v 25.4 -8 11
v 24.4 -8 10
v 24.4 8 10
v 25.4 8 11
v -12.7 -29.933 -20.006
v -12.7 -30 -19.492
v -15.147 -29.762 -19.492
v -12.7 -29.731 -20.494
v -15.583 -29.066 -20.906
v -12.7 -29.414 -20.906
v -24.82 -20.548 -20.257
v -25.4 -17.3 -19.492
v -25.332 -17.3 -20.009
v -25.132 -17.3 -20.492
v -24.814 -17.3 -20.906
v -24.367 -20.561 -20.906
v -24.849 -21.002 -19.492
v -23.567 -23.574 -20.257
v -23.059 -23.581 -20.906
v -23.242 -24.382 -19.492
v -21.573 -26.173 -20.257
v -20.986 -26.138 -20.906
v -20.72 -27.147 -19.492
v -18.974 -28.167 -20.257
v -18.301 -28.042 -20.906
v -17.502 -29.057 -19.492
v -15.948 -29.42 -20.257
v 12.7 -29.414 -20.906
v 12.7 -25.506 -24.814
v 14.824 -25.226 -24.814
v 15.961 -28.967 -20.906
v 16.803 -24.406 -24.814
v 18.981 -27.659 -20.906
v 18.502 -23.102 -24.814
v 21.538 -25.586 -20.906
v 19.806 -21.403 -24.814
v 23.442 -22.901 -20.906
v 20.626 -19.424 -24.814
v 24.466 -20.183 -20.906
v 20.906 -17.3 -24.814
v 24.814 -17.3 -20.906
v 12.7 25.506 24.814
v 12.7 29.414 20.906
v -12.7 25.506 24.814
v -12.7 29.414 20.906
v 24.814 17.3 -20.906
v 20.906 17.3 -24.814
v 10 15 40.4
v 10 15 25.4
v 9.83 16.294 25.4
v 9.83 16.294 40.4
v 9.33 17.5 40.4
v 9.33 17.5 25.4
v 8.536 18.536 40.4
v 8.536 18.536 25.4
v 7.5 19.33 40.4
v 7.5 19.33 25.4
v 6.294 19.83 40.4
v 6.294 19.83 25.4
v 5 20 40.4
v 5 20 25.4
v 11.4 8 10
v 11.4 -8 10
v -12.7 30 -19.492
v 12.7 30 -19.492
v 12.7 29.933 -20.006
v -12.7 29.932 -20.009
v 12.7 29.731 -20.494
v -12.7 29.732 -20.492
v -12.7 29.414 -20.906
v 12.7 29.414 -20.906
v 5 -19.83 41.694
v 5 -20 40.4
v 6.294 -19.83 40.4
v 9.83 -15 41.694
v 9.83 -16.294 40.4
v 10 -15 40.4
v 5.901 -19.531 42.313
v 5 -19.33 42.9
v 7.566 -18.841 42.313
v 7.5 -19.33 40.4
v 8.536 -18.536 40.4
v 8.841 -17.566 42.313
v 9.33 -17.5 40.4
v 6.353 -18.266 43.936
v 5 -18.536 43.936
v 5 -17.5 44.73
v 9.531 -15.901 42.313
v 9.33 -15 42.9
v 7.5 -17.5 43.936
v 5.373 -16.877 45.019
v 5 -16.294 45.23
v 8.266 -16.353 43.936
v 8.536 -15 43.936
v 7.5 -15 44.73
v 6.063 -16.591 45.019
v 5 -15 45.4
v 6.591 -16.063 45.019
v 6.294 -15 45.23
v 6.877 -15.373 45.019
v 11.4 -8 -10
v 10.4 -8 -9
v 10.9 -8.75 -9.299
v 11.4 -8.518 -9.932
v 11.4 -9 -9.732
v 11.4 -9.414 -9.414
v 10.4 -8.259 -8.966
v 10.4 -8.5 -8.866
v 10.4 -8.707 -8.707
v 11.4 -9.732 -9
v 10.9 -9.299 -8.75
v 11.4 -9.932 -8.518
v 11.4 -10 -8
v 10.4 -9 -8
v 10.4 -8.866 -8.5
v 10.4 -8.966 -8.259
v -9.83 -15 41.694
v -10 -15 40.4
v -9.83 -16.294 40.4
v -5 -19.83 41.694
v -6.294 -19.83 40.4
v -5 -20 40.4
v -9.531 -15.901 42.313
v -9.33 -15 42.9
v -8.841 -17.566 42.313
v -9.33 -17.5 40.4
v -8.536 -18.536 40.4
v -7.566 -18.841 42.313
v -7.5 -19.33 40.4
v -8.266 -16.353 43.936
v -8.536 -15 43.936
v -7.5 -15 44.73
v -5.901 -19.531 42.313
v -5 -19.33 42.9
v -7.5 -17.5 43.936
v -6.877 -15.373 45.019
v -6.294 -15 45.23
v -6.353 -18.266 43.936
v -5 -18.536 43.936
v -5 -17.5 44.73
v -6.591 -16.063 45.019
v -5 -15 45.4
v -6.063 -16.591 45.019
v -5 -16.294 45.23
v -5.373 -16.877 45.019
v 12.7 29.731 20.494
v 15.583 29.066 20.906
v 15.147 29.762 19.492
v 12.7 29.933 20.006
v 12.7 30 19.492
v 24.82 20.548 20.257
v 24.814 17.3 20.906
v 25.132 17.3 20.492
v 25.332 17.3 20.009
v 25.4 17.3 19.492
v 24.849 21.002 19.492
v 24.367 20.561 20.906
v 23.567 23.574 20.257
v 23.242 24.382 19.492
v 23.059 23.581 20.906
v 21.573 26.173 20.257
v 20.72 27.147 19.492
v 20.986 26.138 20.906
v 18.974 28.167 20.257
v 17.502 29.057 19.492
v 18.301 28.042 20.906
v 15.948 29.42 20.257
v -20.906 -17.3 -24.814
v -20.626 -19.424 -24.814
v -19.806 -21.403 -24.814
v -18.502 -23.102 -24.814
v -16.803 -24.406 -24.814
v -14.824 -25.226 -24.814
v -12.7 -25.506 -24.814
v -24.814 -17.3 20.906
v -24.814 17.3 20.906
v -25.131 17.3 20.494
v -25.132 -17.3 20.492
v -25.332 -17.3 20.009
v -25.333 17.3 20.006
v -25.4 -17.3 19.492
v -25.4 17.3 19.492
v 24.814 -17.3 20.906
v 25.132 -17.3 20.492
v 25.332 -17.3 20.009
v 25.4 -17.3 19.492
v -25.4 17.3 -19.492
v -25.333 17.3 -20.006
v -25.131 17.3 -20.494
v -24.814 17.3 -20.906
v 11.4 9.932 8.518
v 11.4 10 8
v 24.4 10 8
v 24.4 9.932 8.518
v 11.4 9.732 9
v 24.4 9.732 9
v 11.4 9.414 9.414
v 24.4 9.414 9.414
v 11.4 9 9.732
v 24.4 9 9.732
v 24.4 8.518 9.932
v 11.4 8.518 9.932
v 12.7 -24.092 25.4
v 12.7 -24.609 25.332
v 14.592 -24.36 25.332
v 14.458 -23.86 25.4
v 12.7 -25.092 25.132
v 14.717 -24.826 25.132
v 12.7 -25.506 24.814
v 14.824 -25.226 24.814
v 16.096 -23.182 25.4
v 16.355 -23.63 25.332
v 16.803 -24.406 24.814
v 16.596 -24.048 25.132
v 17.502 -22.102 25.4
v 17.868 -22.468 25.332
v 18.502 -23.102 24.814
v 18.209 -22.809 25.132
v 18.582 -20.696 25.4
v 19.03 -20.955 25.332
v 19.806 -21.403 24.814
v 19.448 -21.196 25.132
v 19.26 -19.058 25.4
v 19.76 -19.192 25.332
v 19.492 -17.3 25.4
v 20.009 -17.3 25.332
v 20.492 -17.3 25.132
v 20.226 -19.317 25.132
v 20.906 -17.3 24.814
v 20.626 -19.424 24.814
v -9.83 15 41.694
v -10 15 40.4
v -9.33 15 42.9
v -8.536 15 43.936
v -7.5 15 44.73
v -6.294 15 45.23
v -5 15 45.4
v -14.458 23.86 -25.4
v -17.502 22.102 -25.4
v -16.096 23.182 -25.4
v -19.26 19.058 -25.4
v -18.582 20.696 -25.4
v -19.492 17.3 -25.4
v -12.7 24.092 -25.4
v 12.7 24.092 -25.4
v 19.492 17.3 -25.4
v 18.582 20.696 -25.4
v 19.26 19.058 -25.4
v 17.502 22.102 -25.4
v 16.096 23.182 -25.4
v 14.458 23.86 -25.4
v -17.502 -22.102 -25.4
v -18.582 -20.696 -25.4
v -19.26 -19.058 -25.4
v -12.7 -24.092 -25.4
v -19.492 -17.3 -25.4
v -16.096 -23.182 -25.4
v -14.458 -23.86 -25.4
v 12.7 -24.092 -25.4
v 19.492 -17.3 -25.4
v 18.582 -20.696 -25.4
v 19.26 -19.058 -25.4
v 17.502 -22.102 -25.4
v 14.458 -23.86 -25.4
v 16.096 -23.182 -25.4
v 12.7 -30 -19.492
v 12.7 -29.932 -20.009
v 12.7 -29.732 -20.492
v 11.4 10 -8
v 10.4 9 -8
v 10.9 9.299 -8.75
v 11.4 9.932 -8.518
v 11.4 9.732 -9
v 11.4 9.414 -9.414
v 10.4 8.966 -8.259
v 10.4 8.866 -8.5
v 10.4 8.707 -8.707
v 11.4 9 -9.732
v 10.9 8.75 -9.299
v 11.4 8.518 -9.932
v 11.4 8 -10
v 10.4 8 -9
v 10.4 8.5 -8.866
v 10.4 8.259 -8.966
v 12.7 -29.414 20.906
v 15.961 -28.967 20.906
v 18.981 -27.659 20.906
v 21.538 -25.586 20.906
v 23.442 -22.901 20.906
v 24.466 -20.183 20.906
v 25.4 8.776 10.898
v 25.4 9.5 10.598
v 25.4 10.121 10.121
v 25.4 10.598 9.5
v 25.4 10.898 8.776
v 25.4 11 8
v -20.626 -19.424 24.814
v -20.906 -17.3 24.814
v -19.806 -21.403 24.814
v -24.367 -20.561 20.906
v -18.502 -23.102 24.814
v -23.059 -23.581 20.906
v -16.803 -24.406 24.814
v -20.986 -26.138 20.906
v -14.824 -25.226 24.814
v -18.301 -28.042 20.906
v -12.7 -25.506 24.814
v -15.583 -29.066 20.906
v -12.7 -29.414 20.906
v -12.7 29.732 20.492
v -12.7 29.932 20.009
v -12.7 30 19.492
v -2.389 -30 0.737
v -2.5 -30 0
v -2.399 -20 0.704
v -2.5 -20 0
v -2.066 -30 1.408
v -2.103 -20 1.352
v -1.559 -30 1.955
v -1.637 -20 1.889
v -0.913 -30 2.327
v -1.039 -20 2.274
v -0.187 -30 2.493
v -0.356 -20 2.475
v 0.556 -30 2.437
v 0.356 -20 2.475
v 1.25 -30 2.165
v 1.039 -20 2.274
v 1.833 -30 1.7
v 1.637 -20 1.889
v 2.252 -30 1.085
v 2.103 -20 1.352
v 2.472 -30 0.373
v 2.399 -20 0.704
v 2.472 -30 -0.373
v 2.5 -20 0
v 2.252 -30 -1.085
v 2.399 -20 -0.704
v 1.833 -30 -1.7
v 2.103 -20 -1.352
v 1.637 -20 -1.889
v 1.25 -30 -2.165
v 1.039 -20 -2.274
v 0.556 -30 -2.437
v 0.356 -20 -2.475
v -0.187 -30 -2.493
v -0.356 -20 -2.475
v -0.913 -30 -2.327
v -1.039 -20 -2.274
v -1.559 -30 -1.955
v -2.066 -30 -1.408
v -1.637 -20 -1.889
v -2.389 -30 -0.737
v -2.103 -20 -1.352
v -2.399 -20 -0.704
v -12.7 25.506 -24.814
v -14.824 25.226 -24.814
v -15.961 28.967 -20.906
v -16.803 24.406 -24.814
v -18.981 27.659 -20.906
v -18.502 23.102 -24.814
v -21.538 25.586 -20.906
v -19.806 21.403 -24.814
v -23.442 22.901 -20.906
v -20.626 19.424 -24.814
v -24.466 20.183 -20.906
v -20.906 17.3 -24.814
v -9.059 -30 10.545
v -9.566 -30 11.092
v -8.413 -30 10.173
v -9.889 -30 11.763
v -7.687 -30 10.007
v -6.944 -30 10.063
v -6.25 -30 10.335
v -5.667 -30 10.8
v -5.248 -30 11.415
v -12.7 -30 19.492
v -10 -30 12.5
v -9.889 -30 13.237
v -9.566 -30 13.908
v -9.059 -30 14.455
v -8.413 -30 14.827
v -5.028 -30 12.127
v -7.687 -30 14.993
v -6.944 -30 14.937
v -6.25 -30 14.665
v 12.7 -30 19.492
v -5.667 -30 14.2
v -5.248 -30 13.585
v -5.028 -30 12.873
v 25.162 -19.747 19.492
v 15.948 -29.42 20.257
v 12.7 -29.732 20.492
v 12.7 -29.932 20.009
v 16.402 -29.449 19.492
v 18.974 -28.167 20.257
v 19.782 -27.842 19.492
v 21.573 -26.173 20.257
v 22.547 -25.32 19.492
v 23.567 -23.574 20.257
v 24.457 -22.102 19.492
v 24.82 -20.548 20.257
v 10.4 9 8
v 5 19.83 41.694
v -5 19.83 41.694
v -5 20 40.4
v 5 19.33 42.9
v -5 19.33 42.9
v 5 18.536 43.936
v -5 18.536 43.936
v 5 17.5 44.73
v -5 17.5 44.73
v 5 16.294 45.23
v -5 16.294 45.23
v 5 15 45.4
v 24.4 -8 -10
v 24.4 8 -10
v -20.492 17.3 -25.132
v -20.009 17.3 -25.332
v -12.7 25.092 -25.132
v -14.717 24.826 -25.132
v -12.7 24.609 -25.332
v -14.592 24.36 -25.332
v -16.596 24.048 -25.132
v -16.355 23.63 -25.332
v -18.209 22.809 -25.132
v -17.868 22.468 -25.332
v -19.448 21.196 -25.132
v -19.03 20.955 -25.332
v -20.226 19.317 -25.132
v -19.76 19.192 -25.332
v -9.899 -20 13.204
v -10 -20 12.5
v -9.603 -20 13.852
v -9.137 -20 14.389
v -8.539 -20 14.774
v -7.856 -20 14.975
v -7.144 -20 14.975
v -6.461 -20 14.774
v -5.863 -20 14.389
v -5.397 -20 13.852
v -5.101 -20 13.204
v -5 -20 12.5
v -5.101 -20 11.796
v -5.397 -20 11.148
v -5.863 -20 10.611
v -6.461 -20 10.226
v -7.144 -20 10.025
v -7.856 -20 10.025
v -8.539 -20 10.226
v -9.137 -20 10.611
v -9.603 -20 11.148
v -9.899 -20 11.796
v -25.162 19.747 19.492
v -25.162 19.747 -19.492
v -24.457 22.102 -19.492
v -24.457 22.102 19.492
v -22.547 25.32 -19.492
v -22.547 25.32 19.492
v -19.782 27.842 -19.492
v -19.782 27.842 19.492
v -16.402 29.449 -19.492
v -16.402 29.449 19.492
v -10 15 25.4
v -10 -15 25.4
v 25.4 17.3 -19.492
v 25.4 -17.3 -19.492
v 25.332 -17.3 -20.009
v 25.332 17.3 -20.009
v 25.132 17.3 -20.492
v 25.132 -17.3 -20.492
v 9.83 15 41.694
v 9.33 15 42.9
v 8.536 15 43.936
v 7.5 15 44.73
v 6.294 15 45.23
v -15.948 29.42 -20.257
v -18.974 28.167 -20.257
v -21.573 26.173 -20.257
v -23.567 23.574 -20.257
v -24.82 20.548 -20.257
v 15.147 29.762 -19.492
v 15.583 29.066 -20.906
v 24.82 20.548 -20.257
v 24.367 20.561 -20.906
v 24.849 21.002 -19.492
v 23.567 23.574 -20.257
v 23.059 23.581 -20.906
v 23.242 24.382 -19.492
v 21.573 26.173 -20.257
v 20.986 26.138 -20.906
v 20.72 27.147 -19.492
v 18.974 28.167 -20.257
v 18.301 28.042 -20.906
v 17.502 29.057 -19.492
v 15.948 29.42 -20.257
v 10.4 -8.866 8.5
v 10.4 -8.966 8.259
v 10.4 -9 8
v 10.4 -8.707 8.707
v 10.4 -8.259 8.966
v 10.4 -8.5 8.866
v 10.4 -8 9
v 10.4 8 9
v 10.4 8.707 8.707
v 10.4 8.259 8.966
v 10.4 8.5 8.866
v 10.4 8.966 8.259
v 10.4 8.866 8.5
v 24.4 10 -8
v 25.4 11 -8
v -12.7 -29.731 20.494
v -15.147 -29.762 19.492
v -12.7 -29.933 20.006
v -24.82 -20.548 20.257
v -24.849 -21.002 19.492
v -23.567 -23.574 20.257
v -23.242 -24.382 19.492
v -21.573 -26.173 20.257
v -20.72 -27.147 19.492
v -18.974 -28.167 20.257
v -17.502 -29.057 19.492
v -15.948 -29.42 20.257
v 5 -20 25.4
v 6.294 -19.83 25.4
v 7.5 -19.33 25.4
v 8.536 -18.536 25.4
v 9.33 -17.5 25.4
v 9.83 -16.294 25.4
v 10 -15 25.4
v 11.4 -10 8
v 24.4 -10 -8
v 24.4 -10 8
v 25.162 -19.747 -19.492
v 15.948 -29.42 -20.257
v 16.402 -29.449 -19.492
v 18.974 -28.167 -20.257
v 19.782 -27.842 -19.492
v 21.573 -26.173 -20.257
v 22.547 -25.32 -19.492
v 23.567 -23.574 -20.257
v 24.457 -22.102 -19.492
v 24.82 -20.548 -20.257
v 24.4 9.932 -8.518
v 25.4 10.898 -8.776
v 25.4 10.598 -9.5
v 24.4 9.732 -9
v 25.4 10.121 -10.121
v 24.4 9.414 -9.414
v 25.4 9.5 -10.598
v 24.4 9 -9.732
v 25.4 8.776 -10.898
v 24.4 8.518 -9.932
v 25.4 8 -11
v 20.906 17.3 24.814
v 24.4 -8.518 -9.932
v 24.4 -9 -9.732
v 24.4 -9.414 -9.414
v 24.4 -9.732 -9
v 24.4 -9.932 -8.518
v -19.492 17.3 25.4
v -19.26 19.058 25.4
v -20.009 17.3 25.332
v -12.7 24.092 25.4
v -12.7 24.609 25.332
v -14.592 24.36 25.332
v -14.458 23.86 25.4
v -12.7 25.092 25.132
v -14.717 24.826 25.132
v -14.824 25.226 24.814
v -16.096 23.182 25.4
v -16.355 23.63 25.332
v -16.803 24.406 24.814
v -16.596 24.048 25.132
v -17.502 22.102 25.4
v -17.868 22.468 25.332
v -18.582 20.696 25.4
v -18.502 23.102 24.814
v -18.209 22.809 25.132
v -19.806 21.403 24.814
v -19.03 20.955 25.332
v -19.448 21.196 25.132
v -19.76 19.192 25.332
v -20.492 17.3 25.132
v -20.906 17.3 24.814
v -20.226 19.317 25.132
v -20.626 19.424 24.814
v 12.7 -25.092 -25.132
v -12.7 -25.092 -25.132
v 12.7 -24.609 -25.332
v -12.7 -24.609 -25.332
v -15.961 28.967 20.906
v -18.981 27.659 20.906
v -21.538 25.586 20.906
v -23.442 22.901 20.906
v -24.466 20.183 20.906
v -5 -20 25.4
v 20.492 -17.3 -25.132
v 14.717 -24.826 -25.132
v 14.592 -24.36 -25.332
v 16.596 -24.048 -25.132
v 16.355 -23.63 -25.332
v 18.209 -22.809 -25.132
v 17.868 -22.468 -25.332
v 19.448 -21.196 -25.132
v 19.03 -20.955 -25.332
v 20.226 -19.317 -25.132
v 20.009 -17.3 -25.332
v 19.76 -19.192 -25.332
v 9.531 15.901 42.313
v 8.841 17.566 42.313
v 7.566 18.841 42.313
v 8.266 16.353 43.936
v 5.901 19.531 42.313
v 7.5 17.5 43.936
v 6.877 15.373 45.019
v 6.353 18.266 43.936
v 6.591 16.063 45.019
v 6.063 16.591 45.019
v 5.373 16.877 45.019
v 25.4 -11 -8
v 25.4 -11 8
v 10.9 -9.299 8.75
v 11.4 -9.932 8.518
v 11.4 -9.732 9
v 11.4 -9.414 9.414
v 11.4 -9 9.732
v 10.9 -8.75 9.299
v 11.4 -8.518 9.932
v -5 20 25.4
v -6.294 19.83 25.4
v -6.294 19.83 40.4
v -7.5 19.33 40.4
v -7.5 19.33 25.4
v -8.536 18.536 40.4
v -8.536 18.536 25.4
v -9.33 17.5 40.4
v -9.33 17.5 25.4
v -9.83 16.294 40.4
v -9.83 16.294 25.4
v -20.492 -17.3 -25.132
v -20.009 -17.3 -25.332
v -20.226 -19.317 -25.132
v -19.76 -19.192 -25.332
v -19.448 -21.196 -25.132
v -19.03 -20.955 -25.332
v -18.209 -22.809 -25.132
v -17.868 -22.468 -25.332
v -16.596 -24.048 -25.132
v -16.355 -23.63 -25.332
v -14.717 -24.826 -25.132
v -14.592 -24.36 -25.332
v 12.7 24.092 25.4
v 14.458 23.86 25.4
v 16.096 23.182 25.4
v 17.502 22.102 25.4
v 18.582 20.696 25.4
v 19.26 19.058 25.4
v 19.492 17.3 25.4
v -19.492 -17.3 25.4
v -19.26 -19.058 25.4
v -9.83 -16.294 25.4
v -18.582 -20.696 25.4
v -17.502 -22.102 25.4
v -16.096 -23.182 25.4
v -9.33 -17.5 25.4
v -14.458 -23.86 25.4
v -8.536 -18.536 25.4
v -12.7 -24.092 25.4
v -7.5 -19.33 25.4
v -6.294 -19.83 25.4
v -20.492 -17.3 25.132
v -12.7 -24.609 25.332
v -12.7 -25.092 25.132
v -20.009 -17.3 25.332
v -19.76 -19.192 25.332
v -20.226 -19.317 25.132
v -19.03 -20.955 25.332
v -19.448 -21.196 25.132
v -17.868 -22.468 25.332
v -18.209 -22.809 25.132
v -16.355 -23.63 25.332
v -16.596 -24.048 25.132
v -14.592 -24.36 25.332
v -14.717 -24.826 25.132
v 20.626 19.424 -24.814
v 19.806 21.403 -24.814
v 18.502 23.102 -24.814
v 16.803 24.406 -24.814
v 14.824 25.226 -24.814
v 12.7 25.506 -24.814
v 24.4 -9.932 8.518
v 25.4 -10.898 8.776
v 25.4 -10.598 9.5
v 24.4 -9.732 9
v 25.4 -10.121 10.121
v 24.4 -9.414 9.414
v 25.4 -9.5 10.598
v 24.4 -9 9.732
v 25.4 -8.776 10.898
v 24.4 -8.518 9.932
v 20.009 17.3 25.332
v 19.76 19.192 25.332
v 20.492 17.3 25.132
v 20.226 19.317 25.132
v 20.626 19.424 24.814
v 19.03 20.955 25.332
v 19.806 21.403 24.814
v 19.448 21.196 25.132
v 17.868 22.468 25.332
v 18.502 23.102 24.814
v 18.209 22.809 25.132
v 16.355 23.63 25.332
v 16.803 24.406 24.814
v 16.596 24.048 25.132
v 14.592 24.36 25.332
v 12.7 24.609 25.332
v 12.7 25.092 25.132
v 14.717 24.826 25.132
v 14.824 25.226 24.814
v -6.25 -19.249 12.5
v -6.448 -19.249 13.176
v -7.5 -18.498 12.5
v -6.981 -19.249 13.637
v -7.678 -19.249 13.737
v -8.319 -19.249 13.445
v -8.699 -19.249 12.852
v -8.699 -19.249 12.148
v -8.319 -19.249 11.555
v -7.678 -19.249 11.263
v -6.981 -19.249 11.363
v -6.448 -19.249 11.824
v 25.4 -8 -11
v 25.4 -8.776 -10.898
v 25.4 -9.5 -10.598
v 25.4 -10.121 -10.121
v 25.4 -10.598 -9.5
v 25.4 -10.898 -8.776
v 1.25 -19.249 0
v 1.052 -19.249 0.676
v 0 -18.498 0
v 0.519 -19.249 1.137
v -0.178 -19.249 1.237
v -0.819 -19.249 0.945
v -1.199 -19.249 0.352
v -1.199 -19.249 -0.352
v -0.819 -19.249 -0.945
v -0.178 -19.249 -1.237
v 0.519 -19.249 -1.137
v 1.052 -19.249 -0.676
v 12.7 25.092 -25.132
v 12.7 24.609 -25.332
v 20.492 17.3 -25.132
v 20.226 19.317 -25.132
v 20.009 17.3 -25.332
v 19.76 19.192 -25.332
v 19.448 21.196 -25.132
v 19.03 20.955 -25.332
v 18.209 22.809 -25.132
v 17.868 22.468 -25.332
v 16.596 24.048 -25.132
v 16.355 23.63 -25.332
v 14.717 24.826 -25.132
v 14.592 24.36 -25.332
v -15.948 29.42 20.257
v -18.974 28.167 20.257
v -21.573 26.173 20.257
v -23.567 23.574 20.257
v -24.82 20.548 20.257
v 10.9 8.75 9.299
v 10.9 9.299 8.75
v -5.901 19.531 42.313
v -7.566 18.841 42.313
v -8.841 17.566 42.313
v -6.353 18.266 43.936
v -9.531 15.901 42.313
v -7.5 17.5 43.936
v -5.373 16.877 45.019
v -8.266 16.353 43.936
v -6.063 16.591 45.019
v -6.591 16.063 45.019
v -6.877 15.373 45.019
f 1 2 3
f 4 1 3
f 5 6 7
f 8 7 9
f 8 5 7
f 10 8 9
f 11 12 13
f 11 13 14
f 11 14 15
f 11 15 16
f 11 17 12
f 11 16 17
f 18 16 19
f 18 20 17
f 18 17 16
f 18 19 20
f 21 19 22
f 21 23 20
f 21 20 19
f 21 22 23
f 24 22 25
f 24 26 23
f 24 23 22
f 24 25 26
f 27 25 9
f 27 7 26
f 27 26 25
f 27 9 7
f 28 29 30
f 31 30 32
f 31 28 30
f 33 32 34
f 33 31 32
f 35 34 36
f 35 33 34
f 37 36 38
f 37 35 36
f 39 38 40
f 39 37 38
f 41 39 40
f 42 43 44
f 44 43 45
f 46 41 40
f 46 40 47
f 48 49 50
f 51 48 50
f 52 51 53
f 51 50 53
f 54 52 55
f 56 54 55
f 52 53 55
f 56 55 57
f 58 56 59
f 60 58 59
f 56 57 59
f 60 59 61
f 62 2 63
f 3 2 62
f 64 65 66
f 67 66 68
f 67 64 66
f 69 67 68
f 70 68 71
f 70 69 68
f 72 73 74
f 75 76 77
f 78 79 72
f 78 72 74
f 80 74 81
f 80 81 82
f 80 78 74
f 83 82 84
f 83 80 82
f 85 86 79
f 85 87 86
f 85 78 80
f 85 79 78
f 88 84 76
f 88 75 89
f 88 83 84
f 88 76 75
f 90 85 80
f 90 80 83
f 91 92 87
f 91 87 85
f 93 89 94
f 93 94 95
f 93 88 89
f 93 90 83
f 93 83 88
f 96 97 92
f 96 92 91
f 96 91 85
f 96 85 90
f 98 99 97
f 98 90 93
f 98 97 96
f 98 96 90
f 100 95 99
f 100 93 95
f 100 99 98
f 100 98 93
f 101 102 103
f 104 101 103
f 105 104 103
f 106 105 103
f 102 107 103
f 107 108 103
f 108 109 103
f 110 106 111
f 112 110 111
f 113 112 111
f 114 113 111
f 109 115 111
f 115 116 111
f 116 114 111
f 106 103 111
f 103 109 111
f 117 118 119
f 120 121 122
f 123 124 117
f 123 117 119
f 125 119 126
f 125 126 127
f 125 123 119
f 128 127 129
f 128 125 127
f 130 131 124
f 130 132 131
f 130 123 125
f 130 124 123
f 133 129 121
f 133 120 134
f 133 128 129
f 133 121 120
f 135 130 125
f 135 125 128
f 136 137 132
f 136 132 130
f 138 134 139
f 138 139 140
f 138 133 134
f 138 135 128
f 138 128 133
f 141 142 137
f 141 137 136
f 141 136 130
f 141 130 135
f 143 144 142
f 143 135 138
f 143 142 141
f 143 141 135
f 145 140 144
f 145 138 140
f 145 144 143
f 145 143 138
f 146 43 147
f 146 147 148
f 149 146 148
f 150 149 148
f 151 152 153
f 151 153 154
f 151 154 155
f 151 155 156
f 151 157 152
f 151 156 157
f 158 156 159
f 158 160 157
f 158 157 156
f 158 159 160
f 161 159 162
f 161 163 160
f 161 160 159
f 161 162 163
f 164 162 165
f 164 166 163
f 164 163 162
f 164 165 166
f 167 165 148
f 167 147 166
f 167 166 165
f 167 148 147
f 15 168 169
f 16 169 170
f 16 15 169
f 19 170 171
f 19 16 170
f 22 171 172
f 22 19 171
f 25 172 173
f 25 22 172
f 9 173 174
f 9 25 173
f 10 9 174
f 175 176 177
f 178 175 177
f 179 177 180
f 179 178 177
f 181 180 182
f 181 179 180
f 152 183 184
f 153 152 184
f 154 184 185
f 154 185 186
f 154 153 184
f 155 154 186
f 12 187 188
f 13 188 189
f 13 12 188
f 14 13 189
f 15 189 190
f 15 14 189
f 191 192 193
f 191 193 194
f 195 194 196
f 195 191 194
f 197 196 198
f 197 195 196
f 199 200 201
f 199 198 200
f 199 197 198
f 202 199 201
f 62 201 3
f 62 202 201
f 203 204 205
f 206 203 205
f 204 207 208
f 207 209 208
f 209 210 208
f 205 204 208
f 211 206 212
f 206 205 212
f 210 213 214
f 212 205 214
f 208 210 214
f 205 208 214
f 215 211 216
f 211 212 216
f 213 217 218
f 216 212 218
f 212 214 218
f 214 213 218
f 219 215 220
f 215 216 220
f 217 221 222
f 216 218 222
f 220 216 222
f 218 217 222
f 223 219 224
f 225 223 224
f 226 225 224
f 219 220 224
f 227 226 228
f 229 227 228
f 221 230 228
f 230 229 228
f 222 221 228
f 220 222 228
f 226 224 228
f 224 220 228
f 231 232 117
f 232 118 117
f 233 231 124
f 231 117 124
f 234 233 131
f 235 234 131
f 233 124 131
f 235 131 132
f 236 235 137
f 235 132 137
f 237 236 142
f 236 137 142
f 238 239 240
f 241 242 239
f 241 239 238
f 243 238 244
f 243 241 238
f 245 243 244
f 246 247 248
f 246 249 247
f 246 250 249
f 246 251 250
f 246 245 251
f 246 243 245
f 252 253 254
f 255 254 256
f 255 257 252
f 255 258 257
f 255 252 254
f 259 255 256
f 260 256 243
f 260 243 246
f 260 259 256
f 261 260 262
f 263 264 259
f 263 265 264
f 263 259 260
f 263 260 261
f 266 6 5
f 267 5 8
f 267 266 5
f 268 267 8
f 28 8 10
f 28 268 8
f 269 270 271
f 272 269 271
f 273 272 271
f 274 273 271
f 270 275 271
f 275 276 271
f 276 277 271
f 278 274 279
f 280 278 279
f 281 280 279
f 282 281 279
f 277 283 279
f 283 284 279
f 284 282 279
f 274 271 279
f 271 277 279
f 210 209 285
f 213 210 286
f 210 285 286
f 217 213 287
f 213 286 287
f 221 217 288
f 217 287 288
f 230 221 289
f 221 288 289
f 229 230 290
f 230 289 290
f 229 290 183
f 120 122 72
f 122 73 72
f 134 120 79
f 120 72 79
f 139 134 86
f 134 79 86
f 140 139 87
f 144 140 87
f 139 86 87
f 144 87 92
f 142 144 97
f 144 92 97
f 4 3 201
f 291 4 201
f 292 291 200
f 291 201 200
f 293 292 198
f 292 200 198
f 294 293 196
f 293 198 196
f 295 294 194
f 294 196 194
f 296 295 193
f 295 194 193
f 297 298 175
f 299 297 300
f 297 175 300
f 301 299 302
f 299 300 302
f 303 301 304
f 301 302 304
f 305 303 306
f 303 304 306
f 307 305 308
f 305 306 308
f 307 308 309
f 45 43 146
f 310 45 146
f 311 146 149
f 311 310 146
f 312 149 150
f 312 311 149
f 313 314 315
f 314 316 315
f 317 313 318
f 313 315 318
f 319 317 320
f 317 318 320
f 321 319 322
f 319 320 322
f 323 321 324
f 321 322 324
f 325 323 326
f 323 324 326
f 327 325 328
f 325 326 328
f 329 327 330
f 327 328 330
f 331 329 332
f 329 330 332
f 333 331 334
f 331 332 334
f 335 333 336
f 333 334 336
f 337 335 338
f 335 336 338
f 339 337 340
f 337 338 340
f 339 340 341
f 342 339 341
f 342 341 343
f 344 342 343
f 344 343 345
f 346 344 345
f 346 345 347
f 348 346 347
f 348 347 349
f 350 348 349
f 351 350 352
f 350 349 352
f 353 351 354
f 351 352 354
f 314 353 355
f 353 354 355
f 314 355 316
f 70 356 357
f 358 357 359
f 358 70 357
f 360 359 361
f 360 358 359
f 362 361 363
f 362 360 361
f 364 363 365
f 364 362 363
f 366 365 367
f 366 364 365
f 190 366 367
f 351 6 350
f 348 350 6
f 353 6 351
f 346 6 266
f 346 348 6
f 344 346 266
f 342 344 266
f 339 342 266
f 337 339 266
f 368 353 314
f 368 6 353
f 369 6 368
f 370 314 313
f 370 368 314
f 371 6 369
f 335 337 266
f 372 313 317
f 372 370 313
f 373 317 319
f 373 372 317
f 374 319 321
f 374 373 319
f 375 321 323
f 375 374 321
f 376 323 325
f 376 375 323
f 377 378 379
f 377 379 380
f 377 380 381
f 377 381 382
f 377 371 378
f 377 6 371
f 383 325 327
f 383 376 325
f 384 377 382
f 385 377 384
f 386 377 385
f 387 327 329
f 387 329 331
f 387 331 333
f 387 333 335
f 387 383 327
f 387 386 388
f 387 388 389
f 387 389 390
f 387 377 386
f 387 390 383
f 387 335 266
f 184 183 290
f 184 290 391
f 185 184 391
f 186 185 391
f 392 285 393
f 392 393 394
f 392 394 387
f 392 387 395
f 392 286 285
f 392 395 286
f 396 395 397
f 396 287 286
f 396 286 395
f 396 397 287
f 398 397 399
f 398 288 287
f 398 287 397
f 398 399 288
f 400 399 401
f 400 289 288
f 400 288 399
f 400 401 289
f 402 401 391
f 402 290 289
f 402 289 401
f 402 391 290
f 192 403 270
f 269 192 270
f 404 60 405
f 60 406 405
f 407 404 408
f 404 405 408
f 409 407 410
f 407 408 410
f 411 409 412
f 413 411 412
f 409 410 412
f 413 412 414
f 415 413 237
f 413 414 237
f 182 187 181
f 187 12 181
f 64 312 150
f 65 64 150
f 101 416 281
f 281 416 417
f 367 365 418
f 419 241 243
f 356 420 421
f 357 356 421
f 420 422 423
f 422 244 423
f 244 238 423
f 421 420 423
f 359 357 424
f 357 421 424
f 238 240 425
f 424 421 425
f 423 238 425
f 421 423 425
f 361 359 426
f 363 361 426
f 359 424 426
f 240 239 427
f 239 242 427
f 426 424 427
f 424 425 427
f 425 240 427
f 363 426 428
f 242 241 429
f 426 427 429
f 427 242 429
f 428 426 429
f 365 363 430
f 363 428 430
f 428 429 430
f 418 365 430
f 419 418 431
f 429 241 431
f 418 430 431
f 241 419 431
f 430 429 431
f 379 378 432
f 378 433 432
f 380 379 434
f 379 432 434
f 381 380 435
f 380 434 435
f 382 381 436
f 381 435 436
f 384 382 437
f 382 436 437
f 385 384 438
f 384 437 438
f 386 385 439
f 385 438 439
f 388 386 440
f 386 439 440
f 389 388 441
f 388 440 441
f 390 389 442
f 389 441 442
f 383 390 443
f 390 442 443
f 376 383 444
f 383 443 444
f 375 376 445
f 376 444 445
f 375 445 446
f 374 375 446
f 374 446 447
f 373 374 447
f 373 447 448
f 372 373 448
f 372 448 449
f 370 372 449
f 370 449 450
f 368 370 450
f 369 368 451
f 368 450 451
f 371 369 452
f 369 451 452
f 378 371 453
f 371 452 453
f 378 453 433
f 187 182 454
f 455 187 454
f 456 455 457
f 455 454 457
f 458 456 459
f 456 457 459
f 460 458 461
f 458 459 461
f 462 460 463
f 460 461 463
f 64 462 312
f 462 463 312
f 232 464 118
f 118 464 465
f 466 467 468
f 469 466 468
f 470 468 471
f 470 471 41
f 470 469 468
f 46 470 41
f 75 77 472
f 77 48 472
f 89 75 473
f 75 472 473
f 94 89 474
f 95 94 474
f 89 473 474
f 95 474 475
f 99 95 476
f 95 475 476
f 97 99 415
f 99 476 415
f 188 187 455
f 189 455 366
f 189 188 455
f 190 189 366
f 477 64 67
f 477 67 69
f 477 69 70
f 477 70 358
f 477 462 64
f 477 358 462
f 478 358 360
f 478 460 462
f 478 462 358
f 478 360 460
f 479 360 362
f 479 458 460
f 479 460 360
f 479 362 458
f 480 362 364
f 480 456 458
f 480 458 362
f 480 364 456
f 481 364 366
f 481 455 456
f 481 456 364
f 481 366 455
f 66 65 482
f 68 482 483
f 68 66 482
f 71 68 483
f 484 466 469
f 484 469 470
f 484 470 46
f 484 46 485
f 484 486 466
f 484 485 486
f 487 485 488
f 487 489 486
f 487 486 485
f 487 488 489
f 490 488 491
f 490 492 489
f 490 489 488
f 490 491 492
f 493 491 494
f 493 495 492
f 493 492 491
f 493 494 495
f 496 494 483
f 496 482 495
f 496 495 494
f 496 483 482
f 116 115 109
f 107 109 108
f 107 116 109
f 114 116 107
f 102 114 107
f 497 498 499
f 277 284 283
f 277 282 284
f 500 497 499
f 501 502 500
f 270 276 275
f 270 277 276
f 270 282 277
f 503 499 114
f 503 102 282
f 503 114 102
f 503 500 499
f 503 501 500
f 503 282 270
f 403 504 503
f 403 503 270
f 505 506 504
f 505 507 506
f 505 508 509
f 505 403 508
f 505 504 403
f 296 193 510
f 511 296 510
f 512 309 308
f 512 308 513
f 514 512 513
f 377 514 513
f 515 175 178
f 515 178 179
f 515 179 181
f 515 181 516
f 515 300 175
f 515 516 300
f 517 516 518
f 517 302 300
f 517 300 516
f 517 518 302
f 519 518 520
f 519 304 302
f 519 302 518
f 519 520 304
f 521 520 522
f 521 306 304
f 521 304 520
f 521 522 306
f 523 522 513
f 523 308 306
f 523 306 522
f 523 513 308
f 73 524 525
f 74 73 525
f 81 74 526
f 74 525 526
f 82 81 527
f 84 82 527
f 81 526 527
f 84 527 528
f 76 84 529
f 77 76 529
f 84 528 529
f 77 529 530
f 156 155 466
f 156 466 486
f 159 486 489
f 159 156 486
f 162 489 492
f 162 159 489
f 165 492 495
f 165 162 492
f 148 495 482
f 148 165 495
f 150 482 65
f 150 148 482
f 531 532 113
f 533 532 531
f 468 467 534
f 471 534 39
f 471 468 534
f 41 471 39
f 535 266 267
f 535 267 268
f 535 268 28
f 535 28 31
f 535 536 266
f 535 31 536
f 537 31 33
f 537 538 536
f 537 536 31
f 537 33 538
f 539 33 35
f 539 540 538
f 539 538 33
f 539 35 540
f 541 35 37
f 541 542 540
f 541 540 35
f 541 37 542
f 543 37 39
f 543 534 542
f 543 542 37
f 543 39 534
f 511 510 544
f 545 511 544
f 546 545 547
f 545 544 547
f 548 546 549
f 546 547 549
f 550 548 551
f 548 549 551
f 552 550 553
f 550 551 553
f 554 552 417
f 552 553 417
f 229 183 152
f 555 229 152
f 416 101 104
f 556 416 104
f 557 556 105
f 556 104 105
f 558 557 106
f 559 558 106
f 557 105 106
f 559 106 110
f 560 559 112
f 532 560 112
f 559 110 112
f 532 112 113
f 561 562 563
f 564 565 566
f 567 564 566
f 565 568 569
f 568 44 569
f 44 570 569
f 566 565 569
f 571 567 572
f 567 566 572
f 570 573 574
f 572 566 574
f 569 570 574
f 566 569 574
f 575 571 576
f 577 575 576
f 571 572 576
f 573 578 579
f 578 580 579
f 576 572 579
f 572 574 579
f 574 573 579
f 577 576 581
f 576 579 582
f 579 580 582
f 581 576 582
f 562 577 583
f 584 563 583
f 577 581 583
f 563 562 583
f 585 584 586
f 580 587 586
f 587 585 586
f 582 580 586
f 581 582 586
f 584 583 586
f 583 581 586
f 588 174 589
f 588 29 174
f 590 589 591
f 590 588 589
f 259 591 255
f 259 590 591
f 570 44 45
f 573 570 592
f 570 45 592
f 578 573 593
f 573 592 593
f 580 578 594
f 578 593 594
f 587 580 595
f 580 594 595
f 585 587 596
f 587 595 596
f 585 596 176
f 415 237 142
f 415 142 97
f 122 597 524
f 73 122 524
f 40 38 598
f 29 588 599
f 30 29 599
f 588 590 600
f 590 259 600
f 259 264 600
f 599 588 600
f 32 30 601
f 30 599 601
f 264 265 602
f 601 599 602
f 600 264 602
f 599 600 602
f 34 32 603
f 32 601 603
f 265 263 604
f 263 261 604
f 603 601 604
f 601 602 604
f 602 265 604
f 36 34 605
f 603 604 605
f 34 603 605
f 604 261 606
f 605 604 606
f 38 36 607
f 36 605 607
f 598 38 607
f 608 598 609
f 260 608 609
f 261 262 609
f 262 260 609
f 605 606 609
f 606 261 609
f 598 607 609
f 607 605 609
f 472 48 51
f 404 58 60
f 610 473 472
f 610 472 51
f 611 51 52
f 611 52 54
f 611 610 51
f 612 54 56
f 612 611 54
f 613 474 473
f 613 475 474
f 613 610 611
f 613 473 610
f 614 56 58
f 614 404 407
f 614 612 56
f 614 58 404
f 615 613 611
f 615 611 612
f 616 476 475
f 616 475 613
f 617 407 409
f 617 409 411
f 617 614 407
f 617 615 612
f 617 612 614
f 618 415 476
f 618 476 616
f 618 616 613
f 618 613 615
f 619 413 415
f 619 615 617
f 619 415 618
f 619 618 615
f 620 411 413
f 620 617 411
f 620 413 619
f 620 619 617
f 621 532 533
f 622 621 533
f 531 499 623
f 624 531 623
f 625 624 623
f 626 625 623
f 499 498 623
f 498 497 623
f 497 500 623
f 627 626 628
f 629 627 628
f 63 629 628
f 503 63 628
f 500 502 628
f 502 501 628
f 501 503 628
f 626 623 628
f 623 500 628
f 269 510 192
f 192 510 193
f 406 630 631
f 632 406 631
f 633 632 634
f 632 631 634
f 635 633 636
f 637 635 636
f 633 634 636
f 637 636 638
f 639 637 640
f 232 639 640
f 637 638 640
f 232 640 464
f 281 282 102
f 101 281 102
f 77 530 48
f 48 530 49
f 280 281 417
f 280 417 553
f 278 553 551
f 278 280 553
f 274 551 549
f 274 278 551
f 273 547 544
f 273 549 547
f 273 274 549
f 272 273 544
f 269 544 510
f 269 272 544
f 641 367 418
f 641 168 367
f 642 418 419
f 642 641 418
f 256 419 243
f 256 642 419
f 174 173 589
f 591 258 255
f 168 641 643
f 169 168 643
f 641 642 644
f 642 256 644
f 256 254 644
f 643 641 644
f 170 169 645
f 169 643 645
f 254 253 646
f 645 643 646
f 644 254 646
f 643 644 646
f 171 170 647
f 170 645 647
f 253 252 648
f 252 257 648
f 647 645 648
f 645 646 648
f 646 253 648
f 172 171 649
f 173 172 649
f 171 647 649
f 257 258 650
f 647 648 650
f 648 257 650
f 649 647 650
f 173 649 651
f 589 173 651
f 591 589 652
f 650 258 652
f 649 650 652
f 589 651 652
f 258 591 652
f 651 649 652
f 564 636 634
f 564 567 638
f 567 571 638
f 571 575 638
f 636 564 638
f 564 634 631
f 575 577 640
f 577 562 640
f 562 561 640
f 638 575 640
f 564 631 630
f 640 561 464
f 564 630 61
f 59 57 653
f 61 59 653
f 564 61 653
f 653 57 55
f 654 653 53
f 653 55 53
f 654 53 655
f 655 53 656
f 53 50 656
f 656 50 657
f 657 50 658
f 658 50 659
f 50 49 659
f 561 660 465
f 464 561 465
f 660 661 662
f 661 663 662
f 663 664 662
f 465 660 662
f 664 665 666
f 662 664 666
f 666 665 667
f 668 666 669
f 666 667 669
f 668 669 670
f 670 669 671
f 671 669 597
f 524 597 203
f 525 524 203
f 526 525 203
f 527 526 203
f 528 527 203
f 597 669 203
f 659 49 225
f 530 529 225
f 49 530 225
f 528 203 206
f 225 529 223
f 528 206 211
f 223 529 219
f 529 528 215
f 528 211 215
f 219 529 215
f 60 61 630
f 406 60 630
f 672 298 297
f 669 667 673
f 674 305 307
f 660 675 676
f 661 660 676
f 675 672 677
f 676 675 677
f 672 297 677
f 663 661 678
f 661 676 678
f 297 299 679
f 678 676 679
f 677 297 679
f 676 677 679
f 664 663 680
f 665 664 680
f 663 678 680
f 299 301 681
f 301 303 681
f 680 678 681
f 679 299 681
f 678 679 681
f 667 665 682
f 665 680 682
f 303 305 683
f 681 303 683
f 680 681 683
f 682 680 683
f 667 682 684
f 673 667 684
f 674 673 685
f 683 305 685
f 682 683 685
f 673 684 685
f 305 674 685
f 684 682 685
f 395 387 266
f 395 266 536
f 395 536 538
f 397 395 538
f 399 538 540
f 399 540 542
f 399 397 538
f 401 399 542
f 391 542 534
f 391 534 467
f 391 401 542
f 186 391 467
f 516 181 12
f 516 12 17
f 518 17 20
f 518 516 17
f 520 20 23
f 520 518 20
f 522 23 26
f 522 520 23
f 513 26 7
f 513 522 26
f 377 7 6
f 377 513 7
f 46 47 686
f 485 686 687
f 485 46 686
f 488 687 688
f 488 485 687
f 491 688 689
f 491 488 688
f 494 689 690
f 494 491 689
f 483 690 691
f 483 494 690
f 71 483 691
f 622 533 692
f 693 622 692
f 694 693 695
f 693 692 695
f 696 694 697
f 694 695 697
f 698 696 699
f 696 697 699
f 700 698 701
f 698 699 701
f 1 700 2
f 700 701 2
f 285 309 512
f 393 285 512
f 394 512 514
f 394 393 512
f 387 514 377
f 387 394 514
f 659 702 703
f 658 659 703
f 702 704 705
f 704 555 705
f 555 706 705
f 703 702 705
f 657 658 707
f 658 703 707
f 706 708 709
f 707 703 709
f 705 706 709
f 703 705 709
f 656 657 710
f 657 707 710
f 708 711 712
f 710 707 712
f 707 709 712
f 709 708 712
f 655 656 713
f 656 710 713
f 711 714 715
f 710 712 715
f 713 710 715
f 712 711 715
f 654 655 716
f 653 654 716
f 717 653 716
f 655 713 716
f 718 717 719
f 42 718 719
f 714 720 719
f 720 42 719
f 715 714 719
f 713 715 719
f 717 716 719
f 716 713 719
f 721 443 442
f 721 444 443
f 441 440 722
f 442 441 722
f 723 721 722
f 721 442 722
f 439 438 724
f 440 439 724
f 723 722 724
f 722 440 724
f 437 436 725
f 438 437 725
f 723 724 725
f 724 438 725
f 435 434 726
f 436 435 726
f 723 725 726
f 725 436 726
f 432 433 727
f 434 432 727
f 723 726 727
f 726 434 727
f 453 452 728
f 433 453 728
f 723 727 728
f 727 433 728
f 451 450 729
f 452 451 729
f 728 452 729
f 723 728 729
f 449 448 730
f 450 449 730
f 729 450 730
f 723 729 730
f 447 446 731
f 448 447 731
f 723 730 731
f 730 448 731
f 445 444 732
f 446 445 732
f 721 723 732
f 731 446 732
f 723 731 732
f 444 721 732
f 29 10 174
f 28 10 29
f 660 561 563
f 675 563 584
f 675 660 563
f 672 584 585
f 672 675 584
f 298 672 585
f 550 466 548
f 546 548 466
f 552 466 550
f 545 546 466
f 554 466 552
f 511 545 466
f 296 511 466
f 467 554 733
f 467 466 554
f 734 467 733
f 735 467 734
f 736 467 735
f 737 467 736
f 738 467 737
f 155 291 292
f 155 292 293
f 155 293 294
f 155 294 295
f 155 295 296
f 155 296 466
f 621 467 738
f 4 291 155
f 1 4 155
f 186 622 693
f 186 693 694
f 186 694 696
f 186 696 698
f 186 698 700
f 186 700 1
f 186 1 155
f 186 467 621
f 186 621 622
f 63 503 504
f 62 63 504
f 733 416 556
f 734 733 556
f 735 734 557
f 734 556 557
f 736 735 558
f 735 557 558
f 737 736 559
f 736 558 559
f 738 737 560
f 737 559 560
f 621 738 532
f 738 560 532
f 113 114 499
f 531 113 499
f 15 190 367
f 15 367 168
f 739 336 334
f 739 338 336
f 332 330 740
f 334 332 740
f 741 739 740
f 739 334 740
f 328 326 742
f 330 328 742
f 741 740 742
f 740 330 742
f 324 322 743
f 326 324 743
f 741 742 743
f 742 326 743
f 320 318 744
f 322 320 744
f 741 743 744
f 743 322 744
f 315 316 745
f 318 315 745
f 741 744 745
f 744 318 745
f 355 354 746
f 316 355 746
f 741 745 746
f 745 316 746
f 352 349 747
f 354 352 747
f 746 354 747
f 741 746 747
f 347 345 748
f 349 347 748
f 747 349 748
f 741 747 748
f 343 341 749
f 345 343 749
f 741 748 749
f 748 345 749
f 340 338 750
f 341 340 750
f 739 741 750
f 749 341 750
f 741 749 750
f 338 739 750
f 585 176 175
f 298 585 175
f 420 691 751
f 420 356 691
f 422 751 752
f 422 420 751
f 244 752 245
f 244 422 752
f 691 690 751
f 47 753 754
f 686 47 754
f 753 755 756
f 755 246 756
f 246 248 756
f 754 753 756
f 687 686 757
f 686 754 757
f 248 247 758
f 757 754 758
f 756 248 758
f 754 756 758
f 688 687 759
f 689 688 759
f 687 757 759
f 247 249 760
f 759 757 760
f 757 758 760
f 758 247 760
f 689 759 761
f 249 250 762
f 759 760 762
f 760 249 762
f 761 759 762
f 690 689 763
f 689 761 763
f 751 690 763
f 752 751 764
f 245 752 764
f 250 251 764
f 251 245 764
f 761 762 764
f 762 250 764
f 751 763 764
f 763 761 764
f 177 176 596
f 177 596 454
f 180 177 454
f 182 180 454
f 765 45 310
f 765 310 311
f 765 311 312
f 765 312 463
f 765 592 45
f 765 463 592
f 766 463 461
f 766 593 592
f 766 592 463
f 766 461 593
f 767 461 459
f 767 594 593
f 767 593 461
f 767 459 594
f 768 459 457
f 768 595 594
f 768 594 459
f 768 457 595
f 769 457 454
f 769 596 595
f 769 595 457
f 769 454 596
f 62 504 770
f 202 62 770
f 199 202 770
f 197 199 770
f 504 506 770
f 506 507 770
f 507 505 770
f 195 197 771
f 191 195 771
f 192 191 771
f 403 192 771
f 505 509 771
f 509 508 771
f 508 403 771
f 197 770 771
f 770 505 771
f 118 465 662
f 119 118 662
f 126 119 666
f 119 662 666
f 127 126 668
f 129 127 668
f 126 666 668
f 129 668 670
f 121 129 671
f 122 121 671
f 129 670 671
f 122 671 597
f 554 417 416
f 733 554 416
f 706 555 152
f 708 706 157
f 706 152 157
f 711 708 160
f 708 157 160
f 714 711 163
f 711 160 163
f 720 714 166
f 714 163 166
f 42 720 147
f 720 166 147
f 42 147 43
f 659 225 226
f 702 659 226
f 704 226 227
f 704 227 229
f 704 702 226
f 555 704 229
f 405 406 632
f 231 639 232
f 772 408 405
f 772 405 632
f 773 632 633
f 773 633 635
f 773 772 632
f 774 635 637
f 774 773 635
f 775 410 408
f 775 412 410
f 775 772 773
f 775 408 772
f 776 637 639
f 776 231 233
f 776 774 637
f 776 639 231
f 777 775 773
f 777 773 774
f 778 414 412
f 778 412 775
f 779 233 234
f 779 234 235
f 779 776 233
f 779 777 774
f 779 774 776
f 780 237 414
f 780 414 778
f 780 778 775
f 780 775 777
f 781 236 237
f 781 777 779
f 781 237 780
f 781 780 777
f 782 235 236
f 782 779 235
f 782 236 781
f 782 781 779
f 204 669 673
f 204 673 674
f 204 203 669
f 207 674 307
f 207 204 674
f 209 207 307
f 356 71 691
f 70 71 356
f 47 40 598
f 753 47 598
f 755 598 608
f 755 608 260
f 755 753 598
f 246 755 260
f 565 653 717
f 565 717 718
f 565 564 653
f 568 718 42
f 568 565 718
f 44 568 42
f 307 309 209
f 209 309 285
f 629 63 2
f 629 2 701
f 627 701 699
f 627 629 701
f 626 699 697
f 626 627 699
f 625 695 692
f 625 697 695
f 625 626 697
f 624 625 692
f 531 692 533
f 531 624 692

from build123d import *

# Parameters (mm, degrees)
F0_W      = 50.8
F0_H      = 50.8
F1_DEPTH  = 30
F2_R      = 12.7
F3_SIZE   = 5.08
F5_DEPTH  = 20
F6_R      = 5
F7_R      = 2
F8_W      = 20
F8_H      = 20
F9_DEPTH  = 15
F10_R     = 2
F11_SIZE  = 1
F13_D     = 5
F13_DEPTH = 10
F13_TIP   = 1.5021515476
F15_D     = 5
F15_DEPTH = 10
F15_TIP   = 1.5021515476


with BuildPart() as f1:
    # F0 (on Front) → F1 (new body, symmetric)
    with BuildSketch(Plane.XZ):
        Rectangle(F0_W, F0_H)
    extrude(amount=F1_DEPTH, both=True)

    # F2
    f2_edges = [f1.edges().sort_by_distance(p)[0] for p in [
        (25.4, -30, 0),
        (-25.4, -30, 0),
        (25.4, 30, 0),
        (-25.4, 30, 0),
    ]]
    fillet(f2_edges, radius=F2_R)

    # F3
    f3_edges = [f1.edges().sort_by_distance(p)[0] for p in [
        (0, -30, 25.4),
        (0, -30, -25.4),
    ]]
    chamfer(f3_edges, length=F3_SIZE)

    # F4 (on face) → F5 (join)
    with BuildSketch(Plane.XY.offset(25.4)):
        with BuildLine():
            ThreePointArc((-10, -15), (-8.5355339059, -18.5355339059), (-5, -20))
            Line((-5, -20), (5, -20))
            ThreePointArc((5, -20), (8.5355339059, -18.5355339059), (10, -15))
            Line((10, -15), (10, 15))
            ThreePointArc((10, 15), (8.5355339059, 18.5355339059), (5, 20))
            Line((5, 20), (-5, 20))
            ThreePointArc((-5, 20), (-8.5355339059, 18.5355339059), (-10, 15))
            Line((-10, 15), (-10, -15))
        make_face()
    extrude(amount=F5_DEPTH)

    # F6
    f6_edges = [f1.edges().sort_by_distance(p)[0] for p in [
        (10, 0, 45.4),
    ]]
    fillet(f6_edges, radius=F6_R)

    # F7
    f7_edges = [f1.edges().sort_by_distance(p)[0] for p in [
        (20.32, 0, 25.4),
        (25.4, 0, 20.32),
        (25.4, 0, -20.32),
        (20.32, 0, -25.4),
    ]]
    fillet(f7_edges, radius=F7_R)

    # F8 (on face) → F9 (cut)
    with BuildSketch(Plane.YZ.offset(25.4)):
        Rectangle(F8_W, F8_H)
    extrude(amount=-F9_DEPTH, mode=Mode.SUBTRACT)

    # F10
    f10_edges = [f1.edges().sort_by_distance(p)[0] for p in [
        (17.9, 10, 10),
        (17.9, -10, 10),
        (17.9, -10, -10),
        (17.9, 10, -10),
    ]]
    fillet(f10_edges, radius=F10_R)

    # F11
    f11_edges = [f1.edges().sort_by_distance(p)[0] for p in [
        (10.4, 0, 10),
        (25.4, 0, 10),
    ]]
    chamfer(f11_edges, length=F11_SIZE)

    # F13
    with Locations(Plane.XZ.offset(30)):
        with Locations((0, 0)):
            Hole(F13_D / 2, depth=F13_DEPTH)
            with Locations((0, 0, -(F13_DEPTH + F13_TIP / 2))):  # 118° drill point
                Cone(0, F13_D / 2, F13_TIP, mode=Mode.SUBTRACT)

    # F15
    with Locations(Plane.XZ.offset(30)):
        with Locations((-7.5, 12.5)):
            Hole(F15_D / 2, depth=F15_DEPTH)
            with Locations((0, 0, -(F15_DEPTH + F15_TIP / 2))):  # 118° drill point
                Cone(0, F15_D / 2, F15_TIP, mode=Mode.SUBTRACT)


solid = f1.part
